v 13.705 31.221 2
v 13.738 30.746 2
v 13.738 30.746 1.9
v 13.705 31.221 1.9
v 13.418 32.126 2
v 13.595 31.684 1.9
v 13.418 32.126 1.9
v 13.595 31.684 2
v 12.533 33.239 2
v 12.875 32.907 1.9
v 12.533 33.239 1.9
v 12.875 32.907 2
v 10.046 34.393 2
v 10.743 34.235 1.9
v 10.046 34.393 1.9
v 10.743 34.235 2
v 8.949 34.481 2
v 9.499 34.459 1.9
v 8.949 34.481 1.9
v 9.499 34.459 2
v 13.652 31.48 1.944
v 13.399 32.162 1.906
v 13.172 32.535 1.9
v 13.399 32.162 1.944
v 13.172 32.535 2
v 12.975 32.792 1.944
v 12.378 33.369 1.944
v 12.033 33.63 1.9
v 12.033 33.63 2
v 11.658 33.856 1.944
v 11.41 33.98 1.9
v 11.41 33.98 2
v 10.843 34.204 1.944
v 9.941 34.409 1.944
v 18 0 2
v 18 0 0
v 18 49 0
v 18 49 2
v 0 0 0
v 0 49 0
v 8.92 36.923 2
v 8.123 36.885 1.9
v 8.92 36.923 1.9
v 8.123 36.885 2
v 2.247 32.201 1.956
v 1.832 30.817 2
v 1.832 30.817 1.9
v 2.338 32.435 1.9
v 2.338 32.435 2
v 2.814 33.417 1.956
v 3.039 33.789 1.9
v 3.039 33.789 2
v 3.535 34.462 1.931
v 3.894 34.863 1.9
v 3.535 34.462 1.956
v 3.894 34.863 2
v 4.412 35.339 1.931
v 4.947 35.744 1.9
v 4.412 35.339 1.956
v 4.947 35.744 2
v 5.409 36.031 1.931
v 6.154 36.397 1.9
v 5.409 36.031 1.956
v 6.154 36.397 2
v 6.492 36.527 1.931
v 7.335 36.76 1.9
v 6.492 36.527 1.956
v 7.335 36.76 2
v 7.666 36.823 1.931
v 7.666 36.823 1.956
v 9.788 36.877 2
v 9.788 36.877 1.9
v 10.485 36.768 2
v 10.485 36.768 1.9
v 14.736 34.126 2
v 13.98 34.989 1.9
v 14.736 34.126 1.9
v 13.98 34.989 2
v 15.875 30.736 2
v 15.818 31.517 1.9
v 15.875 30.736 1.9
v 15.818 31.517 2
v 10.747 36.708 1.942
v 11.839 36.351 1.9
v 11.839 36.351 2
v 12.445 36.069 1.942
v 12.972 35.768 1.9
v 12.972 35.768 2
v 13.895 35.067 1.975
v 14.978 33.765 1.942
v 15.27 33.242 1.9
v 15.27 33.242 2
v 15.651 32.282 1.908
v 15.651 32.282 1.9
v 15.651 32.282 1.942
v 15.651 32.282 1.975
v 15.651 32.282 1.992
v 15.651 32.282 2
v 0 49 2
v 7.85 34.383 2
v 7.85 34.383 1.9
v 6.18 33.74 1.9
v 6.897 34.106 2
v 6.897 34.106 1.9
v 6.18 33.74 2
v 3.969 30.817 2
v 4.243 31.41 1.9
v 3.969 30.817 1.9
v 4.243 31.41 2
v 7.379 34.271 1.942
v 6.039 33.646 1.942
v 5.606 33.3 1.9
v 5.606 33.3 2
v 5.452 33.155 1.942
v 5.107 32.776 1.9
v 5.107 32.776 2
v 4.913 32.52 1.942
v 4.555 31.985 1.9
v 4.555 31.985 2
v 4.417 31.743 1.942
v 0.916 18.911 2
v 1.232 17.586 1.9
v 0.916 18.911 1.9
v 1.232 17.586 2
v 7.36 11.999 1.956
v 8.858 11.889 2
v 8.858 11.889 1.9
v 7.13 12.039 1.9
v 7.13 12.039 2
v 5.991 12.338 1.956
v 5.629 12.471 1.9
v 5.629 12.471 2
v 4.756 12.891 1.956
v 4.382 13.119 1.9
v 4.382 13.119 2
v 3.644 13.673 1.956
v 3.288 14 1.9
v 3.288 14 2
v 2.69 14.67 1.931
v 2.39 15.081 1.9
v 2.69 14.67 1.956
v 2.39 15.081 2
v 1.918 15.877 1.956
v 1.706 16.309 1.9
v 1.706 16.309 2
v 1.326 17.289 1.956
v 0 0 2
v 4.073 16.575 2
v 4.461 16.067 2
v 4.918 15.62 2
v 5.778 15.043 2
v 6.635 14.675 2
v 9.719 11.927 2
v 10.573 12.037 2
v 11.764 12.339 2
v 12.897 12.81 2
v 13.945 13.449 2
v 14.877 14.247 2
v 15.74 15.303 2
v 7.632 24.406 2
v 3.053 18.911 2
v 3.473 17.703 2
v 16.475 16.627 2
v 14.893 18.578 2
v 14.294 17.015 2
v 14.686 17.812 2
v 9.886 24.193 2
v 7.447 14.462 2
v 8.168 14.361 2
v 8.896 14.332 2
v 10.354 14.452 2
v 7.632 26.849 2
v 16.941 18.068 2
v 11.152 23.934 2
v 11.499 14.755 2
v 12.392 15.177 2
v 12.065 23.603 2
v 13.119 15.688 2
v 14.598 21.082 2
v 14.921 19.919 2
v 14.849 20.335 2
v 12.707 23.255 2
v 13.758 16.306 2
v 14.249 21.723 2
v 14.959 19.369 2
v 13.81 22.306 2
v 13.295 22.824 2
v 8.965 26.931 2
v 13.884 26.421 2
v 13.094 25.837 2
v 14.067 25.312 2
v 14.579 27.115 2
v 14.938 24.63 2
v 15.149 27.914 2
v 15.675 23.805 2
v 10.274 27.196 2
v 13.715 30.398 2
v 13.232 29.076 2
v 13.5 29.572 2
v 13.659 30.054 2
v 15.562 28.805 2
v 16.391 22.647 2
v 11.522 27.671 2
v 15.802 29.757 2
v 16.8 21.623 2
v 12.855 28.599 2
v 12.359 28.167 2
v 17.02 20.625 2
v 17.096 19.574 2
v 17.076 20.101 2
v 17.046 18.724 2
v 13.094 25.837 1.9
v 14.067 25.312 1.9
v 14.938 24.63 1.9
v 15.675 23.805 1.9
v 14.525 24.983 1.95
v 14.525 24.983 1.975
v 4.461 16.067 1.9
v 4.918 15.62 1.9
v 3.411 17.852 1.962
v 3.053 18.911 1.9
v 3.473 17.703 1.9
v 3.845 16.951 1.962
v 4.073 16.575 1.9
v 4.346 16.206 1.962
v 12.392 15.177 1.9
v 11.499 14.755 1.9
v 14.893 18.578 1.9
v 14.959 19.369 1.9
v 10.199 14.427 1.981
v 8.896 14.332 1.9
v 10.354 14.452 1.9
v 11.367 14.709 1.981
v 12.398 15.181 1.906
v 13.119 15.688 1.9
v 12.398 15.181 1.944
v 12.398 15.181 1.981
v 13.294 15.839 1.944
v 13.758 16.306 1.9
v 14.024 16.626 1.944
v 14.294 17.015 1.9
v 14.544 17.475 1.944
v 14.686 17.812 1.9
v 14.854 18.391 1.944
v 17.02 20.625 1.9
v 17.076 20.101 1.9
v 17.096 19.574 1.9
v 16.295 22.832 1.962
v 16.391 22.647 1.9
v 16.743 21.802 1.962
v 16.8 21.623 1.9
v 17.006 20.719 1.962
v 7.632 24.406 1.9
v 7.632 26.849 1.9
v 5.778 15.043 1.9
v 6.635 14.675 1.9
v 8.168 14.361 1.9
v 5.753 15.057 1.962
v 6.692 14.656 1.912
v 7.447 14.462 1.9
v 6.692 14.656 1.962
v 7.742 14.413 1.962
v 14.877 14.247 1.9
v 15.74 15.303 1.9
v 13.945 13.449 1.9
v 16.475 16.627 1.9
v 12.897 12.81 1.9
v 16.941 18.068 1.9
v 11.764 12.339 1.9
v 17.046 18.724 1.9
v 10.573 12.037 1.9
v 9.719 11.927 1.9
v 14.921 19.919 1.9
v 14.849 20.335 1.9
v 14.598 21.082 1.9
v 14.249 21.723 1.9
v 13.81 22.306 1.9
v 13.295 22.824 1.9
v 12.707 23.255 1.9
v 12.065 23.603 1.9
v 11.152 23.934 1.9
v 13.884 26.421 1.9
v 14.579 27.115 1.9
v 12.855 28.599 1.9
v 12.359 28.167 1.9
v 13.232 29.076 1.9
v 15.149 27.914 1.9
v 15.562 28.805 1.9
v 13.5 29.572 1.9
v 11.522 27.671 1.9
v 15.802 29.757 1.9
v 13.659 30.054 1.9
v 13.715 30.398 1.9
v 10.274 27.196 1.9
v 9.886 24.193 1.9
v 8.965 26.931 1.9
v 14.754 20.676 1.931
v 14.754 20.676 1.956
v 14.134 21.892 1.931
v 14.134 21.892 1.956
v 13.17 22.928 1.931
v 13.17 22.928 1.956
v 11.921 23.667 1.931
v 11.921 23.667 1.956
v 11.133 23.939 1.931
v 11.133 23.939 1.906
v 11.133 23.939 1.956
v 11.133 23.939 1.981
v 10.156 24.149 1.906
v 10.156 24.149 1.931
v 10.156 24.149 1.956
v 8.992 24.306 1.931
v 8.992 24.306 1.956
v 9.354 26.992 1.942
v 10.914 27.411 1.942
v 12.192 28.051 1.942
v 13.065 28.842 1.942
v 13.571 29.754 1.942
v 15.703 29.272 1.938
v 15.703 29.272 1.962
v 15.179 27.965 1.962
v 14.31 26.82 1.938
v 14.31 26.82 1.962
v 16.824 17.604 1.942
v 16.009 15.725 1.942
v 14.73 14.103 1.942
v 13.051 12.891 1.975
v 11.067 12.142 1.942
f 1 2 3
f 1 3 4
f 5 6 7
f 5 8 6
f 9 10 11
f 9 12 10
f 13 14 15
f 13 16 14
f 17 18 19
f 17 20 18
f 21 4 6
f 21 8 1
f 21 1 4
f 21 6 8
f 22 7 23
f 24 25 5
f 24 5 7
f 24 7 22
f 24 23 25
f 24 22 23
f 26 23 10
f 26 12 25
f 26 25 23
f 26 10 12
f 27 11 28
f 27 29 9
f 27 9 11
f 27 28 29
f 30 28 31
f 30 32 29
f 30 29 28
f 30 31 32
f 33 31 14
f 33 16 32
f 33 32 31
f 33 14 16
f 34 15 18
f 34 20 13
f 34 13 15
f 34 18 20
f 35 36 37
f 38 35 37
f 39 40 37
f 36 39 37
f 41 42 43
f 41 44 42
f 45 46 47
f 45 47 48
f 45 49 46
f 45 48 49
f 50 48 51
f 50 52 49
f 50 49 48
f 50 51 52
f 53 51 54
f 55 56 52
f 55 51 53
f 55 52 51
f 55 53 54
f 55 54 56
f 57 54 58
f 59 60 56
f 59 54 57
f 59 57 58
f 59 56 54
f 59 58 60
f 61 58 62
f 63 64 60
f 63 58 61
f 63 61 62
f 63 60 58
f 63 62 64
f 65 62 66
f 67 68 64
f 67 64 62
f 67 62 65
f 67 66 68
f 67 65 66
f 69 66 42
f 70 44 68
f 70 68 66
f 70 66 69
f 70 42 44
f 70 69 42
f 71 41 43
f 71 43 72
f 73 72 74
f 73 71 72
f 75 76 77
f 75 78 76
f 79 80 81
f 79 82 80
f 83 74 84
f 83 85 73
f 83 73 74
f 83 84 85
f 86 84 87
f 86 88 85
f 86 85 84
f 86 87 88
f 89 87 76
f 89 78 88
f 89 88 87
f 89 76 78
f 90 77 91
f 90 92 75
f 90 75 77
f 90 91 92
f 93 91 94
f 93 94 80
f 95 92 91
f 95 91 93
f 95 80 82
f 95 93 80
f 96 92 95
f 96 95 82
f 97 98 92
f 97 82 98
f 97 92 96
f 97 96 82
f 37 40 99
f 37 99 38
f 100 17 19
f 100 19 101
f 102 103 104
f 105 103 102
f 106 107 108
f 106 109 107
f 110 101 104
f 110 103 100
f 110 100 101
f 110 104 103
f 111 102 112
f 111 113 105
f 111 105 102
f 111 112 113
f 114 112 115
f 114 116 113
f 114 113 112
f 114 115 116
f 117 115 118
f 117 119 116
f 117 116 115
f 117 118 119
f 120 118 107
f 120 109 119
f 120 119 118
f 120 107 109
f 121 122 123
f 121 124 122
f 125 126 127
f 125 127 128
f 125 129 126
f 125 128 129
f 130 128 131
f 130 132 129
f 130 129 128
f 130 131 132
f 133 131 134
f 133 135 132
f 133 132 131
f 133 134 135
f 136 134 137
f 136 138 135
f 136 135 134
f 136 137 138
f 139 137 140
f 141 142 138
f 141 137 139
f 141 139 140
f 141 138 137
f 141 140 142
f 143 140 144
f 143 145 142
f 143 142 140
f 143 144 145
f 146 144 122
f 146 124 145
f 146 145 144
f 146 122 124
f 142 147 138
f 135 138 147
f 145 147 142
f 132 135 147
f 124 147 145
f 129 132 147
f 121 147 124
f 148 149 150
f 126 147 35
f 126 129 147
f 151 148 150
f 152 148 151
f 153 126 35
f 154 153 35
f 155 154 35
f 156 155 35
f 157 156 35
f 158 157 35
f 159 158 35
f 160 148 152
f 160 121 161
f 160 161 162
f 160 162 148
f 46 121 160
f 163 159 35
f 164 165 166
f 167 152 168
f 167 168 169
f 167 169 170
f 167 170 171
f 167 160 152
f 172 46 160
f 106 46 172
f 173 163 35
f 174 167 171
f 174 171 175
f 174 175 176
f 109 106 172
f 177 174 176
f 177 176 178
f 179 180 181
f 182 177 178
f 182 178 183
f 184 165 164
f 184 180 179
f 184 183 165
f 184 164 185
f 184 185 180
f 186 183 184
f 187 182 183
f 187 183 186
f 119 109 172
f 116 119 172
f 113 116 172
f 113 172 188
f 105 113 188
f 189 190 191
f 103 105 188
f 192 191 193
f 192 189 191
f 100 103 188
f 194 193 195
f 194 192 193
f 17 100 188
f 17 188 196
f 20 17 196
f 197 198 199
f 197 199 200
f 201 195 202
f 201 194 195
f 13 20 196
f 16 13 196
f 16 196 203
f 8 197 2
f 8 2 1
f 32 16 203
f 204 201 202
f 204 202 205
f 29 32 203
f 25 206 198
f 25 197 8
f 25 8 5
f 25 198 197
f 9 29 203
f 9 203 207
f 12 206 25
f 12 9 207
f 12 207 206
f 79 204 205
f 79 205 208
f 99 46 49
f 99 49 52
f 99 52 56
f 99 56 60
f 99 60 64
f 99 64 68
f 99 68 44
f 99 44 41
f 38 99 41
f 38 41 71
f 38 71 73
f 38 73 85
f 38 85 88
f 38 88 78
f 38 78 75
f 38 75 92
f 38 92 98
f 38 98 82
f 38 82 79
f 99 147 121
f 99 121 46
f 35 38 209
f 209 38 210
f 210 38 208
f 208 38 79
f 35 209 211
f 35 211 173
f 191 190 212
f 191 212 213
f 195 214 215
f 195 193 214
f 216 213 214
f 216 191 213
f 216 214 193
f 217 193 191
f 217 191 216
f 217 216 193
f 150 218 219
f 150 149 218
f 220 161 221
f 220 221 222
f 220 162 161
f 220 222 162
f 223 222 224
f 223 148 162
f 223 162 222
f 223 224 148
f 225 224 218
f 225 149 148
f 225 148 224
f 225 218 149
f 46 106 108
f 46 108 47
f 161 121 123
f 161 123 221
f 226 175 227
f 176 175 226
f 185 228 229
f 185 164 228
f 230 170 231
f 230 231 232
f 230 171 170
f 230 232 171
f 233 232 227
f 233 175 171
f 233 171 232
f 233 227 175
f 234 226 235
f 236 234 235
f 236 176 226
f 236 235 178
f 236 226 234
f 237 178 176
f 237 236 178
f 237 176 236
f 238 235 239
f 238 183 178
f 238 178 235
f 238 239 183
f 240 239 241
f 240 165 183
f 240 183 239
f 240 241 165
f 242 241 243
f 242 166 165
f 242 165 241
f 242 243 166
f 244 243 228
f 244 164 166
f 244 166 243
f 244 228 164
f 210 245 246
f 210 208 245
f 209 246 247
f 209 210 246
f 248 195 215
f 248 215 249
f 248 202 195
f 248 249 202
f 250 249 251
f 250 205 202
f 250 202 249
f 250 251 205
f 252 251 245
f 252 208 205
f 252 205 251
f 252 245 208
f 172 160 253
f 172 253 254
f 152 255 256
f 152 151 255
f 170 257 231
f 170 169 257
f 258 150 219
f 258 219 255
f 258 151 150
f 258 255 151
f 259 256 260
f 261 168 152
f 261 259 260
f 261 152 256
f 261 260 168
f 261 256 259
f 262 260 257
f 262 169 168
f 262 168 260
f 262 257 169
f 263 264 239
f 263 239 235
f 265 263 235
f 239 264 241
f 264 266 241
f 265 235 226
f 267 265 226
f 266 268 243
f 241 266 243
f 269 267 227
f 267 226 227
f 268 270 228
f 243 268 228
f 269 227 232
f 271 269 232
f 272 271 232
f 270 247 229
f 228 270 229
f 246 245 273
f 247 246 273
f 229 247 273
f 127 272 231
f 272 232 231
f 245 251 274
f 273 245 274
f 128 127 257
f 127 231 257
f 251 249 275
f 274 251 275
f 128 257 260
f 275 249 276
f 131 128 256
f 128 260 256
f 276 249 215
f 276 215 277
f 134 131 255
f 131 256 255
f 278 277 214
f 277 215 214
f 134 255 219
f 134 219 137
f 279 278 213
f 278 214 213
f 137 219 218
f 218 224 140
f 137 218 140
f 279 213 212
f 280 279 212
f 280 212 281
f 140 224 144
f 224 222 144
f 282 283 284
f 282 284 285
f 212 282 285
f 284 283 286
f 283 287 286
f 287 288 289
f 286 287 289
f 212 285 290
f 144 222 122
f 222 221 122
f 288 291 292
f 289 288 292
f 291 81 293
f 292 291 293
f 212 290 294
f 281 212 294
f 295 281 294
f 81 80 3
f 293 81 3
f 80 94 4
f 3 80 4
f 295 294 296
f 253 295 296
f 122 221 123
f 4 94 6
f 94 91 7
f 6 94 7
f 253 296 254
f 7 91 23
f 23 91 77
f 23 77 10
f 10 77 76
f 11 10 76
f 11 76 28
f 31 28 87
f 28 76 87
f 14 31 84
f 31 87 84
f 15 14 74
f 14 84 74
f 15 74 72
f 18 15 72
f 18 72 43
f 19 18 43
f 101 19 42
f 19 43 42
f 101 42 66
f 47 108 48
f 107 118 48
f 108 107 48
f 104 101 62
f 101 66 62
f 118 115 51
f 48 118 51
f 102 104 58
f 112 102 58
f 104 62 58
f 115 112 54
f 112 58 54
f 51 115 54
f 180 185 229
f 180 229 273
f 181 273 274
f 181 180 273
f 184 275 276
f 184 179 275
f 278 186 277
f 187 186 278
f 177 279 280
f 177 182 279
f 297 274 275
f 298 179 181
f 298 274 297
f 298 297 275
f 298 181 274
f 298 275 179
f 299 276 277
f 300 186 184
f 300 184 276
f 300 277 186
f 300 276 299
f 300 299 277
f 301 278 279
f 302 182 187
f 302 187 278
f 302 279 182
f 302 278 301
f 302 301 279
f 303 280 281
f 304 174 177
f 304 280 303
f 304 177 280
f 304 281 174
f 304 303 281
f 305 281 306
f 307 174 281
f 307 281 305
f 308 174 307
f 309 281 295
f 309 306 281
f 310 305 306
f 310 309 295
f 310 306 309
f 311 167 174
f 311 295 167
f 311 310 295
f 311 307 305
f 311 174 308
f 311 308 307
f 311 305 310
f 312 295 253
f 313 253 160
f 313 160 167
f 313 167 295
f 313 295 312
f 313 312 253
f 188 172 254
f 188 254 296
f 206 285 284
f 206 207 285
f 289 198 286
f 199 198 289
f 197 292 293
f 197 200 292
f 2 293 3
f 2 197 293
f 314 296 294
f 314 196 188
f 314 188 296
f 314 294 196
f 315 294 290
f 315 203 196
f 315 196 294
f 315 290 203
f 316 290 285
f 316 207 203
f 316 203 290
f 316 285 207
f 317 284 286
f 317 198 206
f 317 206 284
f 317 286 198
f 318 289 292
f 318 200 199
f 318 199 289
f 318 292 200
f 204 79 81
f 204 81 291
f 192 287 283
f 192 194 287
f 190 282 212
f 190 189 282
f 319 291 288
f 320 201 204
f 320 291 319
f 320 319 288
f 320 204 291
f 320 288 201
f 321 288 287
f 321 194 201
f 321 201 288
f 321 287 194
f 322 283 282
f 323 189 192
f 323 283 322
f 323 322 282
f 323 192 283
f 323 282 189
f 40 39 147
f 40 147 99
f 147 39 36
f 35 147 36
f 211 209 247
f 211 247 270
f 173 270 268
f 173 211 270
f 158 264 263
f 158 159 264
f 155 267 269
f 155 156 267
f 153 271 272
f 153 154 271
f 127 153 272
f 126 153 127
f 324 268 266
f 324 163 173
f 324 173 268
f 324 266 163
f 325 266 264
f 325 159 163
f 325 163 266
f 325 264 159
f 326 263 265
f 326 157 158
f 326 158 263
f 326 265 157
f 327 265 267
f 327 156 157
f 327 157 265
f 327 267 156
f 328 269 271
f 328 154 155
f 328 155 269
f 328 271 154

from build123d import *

# Parameters (mm, degrees)
SKETCH_1_W          = 18
SKETCH_1_H          = 49
EXTRUDE_1_DEPTH     = 2
CUT_EXTRUDE_1_DEPTH = 0.1


with BuildPart() as part:
    # ｽｹｯﾁ1 → ﾎﾞｽ - 押し出し1 (new body)
    with BuildSketch(Plane.XY):
        with Locations((9, 24.5)):
            Rectangle(SKETCH_1_W, SKETCH_1_H)
    extrude(amount=EXTRUDE_1_DEPTH)

    # ｽｹｯﾁ2 → ｶｯﾄ - 押し出し1 (cut)
    with BuildSketch(Plane.XY.offset(2)):
        with BuildLine():
            Line((3.96875, 30.817307692), (1.831730769, 30.817307692))
            add(Edge.make_bspline(
                [(1.831730769, 30.817307692), (1.889626105, 31.057014414), (2.002806751, 31.525621447), (2.238874171, 32.195142276), (2.496044103, 32.828714805), (2.804852118, 33.414475592), (3.141688464, 33.964196698), (3.527605552, 34.465409849), (3.944798664, 34.930862346), (4.406250551, 35.343929194), (4.890179482, 35.717974102), (5.403404305, 36.036891903), (5.93559935, 36.311240157), (6.490451915, 36.537256378), (7.069613904, 36.707519315), (7.667849377, 36.831050439), (8.286726048, 36.911272127), (8.706830191, 36.919101426), (8.920147236, 36.923076923)],
                knots=[0, 0, 0, 0, 1.162005537, 2.271625781, 3.343758855, 4.383309926, 5.390229558, 6.379919256, 7.361854164, 8.333198761, 9.295911338, 10.242430842, 11.177959212, 12.116337295, 13.062827104, 14.020064771, 14.994644689, 16, 16, 16, 16], degree=3))
            add(Edge.make_bspline(
                [(8.920147236, 36.923076923), (9.230953034, 36.913693232), (9.845785055, 36.895130534), (10.749047928, 36.725623386), (11.620087537, 36.457391682), (12.449369741, 36.086775788), (13.219659434, 35.629662104), (13.905025276, 35.085616305), (14.496177465, 34.465135343), (14.992119571, 33.779794147), (15.380433403, 33.047352199), (15.666771052, 32.293515415), (15.841089988, 31.520072003), (15.863681634, 30.997848371), (15.875, 30.736215445)],
                knots=[0, 0, 0, 0, 1.083050992, 2.142477498, 3.193116406, 4.255571735, 5.30263384, 6.308962982, 7.297363603, 8.282367274, 9.249857812, 10.179914175, 11.08814088, 12, 12, 12, 12], degree=3))
            add(Edge.make_bspline(
                [(15.875, 30.736215445), (15.867083425, 30.484437074), (15.851591917, 29.991745873), (15.72005367, 29.272462115), (15.498690882, 28.594543371), (15.192055533, 27.955135821), (14.795124628, 27.358293607), (14.314297887, 26.802673886), (13.746181563, 26.285812292), (13.315658788, 25.989724449), (13.094012921, 25.837289663)],
                knots=[0, 0, 0, 0, 1.024540389, 2.004866551, 2.965041327, 3.920577974, 4.882998113, 5.874504559, 6.905732034, 8, 8, 8, 8], degree=3))
            add(Edge.make_bspline(
                [(13.094012921, 25.837289663), (13.347321822, 25.714973889), (13.84920002, 25.472630963), (14.53330273, 24.997362327), (15.154318275, 24.448611107), (15.500645363, 24.020376272), (15.674654447, 23.805213341)],
                knots=[0, 0, 0, 0, 1.015518401, 2.012035669, 3.001164323, 4, 4, 4, 4], degree=3))
            add(Edge.make_bspline(
                [(15.674654447, 23.805213341), (15.789235723, 23.648338281), (16.016521926, 23.337157099), (16.297070826, 22.836846773), (16.551586407, 22.330991105), (16.749912006, 21.806031574), (16.903494922, 21.268052678), (17.01327757, 20.716130662), (17.081477528, 20.14981483), (17.091244409, 19.766688849), (17.096153846, 19.57410607)],
                knots=[0, 0, 0, 0, 1.025084078, 2.033381695, 3.024893161, 4.013698104, 4.991890475, 5.976764909, 6.982997093, 8, 8, 8, 8], degree=3))
            add(Edge.make_bspline(
                [(17.096153846, 19.57410607), (17.083944745, 19.240664931), (17.059584, 18.575351833), (16.841841994, 17.592407744), (16.504294767, 16.631569952), (16.024935971, 15.712578635), (15.440730241, 14.852740686), (14.745695589, 14.08341794), (13.947729132, 13.422120293), (13.057783557, 12.869600706), (12.09360095, 12.427926985), (11.062345583, 12.121375454), (9.978876466, 11.921717849), (9.235876817, 11.900307902), (8.858135517, 11.889423077)],
                knots=[0, 0, 0, 0, 0.955779014, 1.907060117, 2.875433937, 3.871313158, 4.872415639, 5.851225146, 6.836215519, 7.83643374, 8.849228613, 9.86973379, 10.916971861, 12, 12, 12, 12], degree=3))
            add(Edge.make_bspline(
                [(8.858135517, 11.889423077), (8.603550635, 11.895330028), (8.10261248, 11.906952938), (7.366170107, 11.986409135), (6.663213546, 12.131529349), (5.992792353, 12.326814337), (5.354310945, 12.574408154), (4.749717658, 12.882737153), (4.175292847, 13.245445765), (3.636457125, 13.666815354), (3.133274727, 14.138175897), (2.6791178, 14.667895233), (2.266414566, 15.246181142), (1.906215542, 15.879750506), (1.582114132, 16.56041556), (1.315543695, 17.296891951), (1.080918665, 18.082595744), (0.971833846, 18.630131797), (0.915865385, 18.911057692)],
                knots=[0, 0, 0, 0, 1.048658725, 2.063410685, 3.046034179, 4.001477787, 4.936774919, 5.862367409, 6.792675028, 7.730719943, 8.675894397, 9.627829632, 10.600096036, 11.597688215, 12.626045268, 13.701542398, 14.82072376, 16, 16, 16, 16], degree=3))
            Line((0.915865385, 18.911057692), (3.052884615, 18.911057692))
            add(Edge.make_bspline(
                [(3.052884615, 18.911057692), (3.108560223, 18.727708156), (3.216854116, 18.371077381), (3.401192108, 17.857813873), (3.611206602, 17.387292118), (3.836503867, 16.95606052), (4.073121509, 16.55987221), (4.337881982, 16.209203423), (4.61117563, 15.888651779), (4.817183373, 15.708053616), (4.91800631, 15.619666466)],
                knots=[0, 0, 0, 0, 1.198163088, 2.33053128, 3.407730985, 4.417276592, 5.372219308, 6.28897303, 7.162600585, 8, 8, 8, 8], degree=3))
            add(Edge.make_bspline(
                [(4.91800631, 15.619666466), (5.051333018, 15.516875838), (5.317574885, 15.311611871), (5.7514266, 15.049663291), (6.207707343, 14.822689173), (6.696303609, 14.649309029), (7.206671958, 14.502503872), (7.747061711, 14.406433912), (8.312705313, 14.340519746), (8.698928847, 14.334703158), (8.896296575, 14.331730769)],
                knots=[0, 0, 0, 0, 0.946170439, 1.889420265, 2.845303464, 3.807233317, 4.801018734, 5.828864929, 6.890507805, 8, 8, 8, 8], degree=3))
            add(Edge.make_bspline(
                [(8.896296575, 14.331730769), (9.119137369, 14.335921125), (9.554883306, 14.344115003), (10.190710117, 14.419469365), (10.795598287, 14.529213785), (11.362831943, 14.698711043), (11.899841288, 14.908130765), (12.399098582, 15.171077952), (12.867157805, 15.479584005), (13.298023938, 15.830234352), (13.685456766, 16.214102024), (14.026584526, 16.615601668), (14.316584455, 17.033040437), (14.550515585, 17.468728367), (14.735236293, 17.920861263), (14.860988069, 18.390707941), (14.94842427, 18.87442327), (14.95554497, 19.203232863), (14.959134615, 19.368990385)],
                knots=[0, 0, 0, 0, 1.217147791, 2.380027433, 3.494444702, 4.572153297, 5.609568379, 6.639424714, 7.649109417, 8.668170816, 9.669597737, 10.625200337, 11.543417969, 12.441394052, 13.322311151, 14.205496177, 15.095365482, 16, 16, 16, 16], degree=3))
            add(Edge.make_bspline(
                [(14.959134615, 19.368990385), (14.9487231, 19.590863958), (14.927951874, 20.033507093), (14.769370289, 20.684728446), (14.508529088, 21.31217702), (14.143364324, 21.905147663), (13.698848027, 22.454712279), (13.179293929, 22.945055758), (12.580387589, 23.349664771), (12.029163123, 23.629214379), (11.540903755, 23.819966623), (11.1230598, 23.947023077), (10.655269338, 24.054612413), (10.143189357, 24.154708404), (9.582961402, 24.23989829), (8.975195387, 24.310939929), (8.319768151, 24.367784047), (7.866030041, 24.393168821), (7.632211538, 24.40625)],
                knots=[0, 0, 0, 0, 1.07054697, 2.135767047, 3.216561865, 4.33974944, 5.486079747, 6.621378074, 7.775625952, 8.963672916, 9.598146892, 10.304877434, 11.070270905, 11.915000392, 12.823868403, 13.805723172, 14.86925407, 16, 16, 16, 16], degree=3))
            Line((7.632211538, 24.40625), (7.632211538, 26.848557692))
            add(Edge.make_bspline(
                [(7.632211538, 26.848557692), (7.926814112, 26.853556982), (8.503868184, 26.863349362), (9.346791937, 26.981786004), (10.152833578, 27.145620277), (10.904129805, 27.396571318), (11.588900515, 27.688038337), (12.182985665, 28.027211406), (12.678062149, 28.40422961), (13.071724082, 28.824912185), (13.367878298, 29.276091347), (13.584414188, 29.746331464), (13.712323551, 30.239754093), (13.729398249, 30.576494602), (13.737980769, 30.745755709)],
                knots=[0, 0, 0, 0, 1.321986639, 2.589447074, 3.816329219, 5.01088745, 6.139805852, 7.153945165, 8.075214402, 8.924034688, 9.728124013, 10.488707548, 11.240355623, 12, 12, 12, 12], degree=3))
            add(Edge.make_bspline(
                [(13.737980769, 30.745755709), (13.735161295, 30.870109654), (13.729552084, 31.117505929), (13.658813462, 31.478946128), (13.552514183, 31.829336493), (13.40637531, 32.167186952), (13.21077128, 32.490154351), (12.976687693, 32.800992173), (12.697958296, 33.097925741), (12.378561594, 33.374697201), (12.035581278, 33.638466475), (11.659685487, 33.862396755), (11.26220809, 34.053883695), (10.842709027, 34.211791201), (10.399826937, 34.330576715), (9.935642679, 34.415865208), (9.449271118, 34.469189251), (9.117449155, 34.47686651), (8.948768029, 34.480769231)],
                knots=[0, 0, 0, 0, 0.884392785, 1.759457502, 2.611959086, 3.489218968, 4.37281399, 5.2945488, 6.255912374, 7.266815255, 8.301784654, 9.332968512, 10.37626691, 11.440494194, 12.520033166, 13.637162961, 14.798855837, 16, 16, 16, 16], degree=3))
            add(Edge.make_bspline(
                [(8.948768029, 34.480769231), (8.677634359, 34.471303), (8.148047241, 34.45281325), (7.384585039, 34.290867747), (6.674840998, 34.032481144), (6.132333285, 33.724054708), (5.731721485, 33.419591935), (5.445448031, 33.153692127), (5.164320987, 32.858193809), (4.906835221, 32.514896649), (4.646435487, 32.14704938), (4.409368024, 31.735952547), (4.179001189, 31.292329793), (4.040190985, 30.97871485), (3.96875, 30.817307692)],
                knots=[0, 0, 0, 0, 1.472543308, 2.876219568, 4.221790263, 5.565193594, 6.249813518, 6.953379497, 7.687249741, 8.463570142, 9.283606569, 10.136032583, 11.040678096, 12, 12, 12, 12], degree=3))
        make_face()
    extrude(amount=-CUT_EXTRUDE_1_DEPTH, mode=Mode.SUBTRACT)


solid = part.part
